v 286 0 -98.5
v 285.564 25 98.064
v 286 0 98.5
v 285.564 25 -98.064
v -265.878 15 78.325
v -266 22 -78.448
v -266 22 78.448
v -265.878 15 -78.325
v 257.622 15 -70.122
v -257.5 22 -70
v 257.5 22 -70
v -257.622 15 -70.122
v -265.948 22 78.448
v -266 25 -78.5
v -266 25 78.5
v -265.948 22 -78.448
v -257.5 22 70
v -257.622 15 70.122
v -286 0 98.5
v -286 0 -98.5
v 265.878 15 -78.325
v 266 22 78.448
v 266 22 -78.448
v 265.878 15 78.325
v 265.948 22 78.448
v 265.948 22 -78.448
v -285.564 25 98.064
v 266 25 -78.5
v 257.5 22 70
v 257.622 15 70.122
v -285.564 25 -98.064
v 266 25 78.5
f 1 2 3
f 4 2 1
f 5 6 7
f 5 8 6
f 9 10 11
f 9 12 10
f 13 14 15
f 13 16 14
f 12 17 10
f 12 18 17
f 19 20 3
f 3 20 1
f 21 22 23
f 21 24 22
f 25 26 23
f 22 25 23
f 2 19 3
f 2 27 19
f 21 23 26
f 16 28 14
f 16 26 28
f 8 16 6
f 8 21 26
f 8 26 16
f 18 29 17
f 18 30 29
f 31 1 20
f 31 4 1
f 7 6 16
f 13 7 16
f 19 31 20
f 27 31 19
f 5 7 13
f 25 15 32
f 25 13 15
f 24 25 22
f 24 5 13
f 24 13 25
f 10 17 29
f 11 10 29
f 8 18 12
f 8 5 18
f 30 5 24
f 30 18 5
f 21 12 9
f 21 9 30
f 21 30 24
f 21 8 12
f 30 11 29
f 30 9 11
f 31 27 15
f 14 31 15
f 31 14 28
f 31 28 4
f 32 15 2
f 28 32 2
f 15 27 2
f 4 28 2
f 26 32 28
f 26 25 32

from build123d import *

# Parameters (mm, degrees)
SKETCH1_W           = 572
SKETCH1_H           = 197
BOSS_EXTRUDE1_DEPTH = 25
BOSS_EXTRUDE1_TAPER = 1
SKETCH2_W           = 532
SKETCH2_H           = 157
CUT_EXTRUDE1_DEPTH  = 3
CUT_EXTRUDE1_TAPER  = 1
SKETCH4_W           = 532
SKETCH4_H           = 156.89526961
SKETCH4_W_2         = 515
SKETCH4_H_2         = 140
CUT_EXTRUDE2_DEPTH  = 7
CUT_EXTRUDE2_TAPER  = 1


with BuildPart() as part:
    # Sketch1 → Boss-Extrude1 (new body)
    with BuildSketch(Plane(origin=(0, 0, 0), x_dir=(1, 0, 0), z_dir=(0, 1, 0))):
        Rectangle(SKETCH1_W, SKETCH1_H)
    extrude(amount=BOSS_EXTRUDE1_DEPTH, taper=BOSS_EXTRUDE1_TAPER)

    # Sketch2 → Cut-Extrude1 (cut)
    with BuildSketch(Plane(origin=(0, 25, 0), x_dir=(1, 0, 0), z_dir=(0, 1, 0))):
        Rectangle(SKETCH2_W, SKETCH2_H)
    extrude(amount=-CUT_EXTRUDE1_DEPTH, taper=CUT_EXTRUDE1_TAPER, mode=Mode.SUBTRACT)

    # Sketch4 → Cut-Extrude2 (cut)
    with BuildSketch(Plane(origin=(0, 22, 0), x_dir=(1, 0, 0), z_dir=(0, 1, 0))):
        Rectangle(SKETCH4_W, SKETCH4_H)
        Rectangle(SKETCH4_W_2, SKETCH4_H_2, mode=Mode.SUBTRACT)
    extrude(amount=-CUT_EXTRUDE2_DEPTH, taper=CUT_EXTRUDE2_TAPER, mode=Mode.SUBTRACT)


solid = part.part
